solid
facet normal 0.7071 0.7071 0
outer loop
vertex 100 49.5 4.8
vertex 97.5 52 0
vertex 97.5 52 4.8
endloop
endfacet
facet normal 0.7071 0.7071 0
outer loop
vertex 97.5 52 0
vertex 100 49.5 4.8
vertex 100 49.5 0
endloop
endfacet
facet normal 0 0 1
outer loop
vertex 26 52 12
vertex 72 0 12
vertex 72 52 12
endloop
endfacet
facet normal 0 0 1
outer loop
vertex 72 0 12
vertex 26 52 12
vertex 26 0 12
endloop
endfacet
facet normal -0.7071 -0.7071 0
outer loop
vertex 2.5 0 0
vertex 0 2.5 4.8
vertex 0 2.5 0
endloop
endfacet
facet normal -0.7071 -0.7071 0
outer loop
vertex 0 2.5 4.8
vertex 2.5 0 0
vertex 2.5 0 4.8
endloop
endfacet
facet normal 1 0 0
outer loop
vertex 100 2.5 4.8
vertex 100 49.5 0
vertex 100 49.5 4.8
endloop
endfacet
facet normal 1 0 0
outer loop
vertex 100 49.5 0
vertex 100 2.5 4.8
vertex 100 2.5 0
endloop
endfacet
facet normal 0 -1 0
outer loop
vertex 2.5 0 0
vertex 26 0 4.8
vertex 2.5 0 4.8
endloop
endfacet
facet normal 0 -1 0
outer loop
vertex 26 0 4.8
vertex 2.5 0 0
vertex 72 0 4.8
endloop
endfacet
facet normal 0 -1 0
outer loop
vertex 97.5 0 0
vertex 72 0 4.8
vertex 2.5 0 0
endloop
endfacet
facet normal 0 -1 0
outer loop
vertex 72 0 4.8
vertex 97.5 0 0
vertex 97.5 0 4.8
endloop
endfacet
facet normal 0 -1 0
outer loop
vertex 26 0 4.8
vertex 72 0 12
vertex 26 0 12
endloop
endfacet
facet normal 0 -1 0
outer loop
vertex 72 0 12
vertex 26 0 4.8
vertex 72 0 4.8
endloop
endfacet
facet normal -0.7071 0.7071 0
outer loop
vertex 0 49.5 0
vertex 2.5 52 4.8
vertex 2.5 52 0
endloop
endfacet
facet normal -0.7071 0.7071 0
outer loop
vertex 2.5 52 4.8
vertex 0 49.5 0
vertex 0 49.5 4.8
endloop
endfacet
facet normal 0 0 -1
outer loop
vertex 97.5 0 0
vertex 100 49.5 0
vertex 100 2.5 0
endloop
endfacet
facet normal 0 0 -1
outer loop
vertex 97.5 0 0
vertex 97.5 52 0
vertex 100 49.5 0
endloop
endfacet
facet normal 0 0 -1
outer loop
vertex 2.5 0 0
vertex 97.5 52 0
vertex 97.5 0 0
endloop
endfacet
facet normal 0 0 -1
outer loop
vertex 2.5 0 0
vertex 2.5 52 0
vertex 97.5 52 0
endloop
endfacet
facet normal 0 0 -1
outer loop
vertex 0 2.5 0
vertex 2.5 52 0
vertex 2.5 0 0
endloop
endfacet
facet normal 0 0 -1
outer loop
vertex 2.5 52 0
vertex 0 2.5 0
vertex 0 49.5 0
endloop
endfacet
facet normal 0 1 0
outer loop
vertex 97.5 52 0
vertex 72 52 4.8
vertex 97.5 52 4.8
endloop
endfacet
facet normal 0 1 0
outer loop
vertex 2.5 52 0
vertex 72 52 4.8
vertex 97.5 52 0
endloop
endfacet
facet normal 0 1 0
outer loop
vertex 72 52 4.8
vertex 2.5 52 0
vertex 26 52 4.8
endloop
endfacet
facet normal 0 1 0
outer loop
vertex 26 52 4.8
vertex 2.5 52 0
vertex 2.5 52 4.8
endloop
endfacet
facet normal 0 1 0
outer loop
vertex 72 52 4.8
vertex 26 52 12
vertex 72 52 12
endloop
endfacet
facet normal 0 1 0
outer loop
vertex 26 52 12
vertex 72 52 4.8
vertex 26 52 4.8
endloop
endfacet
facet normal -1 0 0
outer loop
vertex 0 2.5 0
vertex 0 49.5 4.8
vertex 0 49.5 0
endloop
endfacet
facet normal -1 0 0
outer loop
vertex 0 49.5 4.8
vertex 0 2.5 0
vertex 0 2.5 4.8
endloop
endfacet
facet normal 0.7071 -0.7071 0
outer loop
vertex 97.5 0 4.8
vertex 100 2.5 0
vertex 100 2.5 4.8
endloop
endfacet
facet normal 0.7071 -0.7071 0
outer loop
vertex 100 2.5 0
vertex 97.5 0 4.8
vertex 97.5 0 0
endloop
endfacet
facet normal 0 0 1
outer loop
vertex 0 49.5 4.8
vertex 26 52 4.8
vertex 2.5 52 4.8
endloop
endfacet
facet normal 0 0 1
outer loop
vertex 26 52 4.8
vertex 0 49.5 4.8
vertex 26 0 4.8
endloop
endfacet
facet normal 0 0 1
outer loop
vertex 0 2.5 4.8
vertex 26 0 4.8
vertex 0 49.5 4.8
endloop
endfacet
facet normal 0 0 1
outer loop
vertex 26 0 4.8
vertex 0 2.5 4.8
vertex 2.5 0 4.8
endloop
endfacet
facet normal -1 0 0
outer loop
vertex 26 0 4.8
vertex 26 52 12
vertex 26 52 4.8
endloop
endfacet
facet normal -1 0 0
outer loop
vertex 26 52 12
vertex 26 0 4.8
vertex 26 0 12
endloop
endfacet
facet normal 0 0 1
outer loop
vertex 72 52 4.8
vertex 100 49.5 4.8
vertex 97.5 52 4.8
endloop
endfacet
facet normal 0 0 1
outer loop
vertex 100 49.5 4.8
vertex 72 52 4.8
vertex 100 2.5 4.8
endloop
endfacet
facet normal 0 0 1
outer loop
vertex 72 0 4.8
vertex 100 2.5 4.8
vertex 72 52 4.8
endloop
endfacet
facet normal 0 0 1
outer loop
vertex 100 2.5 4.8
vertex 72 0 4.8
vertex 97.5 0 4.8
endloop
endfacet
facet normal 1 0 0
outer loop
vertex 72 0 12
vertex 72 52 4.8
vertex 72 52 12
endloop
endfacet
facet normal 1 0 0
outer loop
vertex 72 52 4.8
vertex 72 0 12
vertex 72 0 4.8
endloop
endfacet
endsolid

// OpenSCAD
$fn = 32;

// ----------------------------------------------------------------------
// Stepped bar: centerstep, 100 x 52 x 12/4.8 mm
// ----------------------------------------------------------------------

// --- parameters (mm) ---
bar_l = 100;              // bar length, X
bar_w = 52;               // bar width, Y
plate_t = 12;             // thickness of the thick zone, Z
thin_t = 4.8;             // thickness of the thin zone
corner_c = 2.5;           // corner chamfer of the bar
step_cut = 7.2;           // material removed from the thin zone
thick_from = 26;          // start of the thick middle zone
thick_to = 72;            // end of the thick middle zone
depth_1 = 7.2;            // depth of cut 1 from the top face
depth_2 = 7.2;            // depth of cut 2 from the top face
fit_tol = 0.1;            // declared fit tolerance (prompt contract)
free_tol = 0.5;           // declared free tolerance (prompt contract)

profile = [[2.5, 0], [97.5, 0], [100, 2.5], [100, 49.5], [97.5, 52], [2.5, 52], [0, 49.5], [0, 2.5]];  // primary outline, 8 points, counter clockwise
void_1 = [[-1, -1], [26, -1], [26, 53], [-1, 53]];  // thin left end, 4 points
void_2 = [[72, -1], [101, -1], [101, 53], [72, 53]];  // thin right end, 4 points

// --- the one profile operation ---
difference() {
  linear_extrude(height = plate_t) polygon(points = profile);
  translate([0, 0, plate_t - depth_1])
    linear_extrude(height = depth_1 + 1) polygon(points = void_1);
  translate([0, 0, plate_t - depth_2])
    linear_extrude(height = depth_2 + 1) polygon(points = void_2);
}
